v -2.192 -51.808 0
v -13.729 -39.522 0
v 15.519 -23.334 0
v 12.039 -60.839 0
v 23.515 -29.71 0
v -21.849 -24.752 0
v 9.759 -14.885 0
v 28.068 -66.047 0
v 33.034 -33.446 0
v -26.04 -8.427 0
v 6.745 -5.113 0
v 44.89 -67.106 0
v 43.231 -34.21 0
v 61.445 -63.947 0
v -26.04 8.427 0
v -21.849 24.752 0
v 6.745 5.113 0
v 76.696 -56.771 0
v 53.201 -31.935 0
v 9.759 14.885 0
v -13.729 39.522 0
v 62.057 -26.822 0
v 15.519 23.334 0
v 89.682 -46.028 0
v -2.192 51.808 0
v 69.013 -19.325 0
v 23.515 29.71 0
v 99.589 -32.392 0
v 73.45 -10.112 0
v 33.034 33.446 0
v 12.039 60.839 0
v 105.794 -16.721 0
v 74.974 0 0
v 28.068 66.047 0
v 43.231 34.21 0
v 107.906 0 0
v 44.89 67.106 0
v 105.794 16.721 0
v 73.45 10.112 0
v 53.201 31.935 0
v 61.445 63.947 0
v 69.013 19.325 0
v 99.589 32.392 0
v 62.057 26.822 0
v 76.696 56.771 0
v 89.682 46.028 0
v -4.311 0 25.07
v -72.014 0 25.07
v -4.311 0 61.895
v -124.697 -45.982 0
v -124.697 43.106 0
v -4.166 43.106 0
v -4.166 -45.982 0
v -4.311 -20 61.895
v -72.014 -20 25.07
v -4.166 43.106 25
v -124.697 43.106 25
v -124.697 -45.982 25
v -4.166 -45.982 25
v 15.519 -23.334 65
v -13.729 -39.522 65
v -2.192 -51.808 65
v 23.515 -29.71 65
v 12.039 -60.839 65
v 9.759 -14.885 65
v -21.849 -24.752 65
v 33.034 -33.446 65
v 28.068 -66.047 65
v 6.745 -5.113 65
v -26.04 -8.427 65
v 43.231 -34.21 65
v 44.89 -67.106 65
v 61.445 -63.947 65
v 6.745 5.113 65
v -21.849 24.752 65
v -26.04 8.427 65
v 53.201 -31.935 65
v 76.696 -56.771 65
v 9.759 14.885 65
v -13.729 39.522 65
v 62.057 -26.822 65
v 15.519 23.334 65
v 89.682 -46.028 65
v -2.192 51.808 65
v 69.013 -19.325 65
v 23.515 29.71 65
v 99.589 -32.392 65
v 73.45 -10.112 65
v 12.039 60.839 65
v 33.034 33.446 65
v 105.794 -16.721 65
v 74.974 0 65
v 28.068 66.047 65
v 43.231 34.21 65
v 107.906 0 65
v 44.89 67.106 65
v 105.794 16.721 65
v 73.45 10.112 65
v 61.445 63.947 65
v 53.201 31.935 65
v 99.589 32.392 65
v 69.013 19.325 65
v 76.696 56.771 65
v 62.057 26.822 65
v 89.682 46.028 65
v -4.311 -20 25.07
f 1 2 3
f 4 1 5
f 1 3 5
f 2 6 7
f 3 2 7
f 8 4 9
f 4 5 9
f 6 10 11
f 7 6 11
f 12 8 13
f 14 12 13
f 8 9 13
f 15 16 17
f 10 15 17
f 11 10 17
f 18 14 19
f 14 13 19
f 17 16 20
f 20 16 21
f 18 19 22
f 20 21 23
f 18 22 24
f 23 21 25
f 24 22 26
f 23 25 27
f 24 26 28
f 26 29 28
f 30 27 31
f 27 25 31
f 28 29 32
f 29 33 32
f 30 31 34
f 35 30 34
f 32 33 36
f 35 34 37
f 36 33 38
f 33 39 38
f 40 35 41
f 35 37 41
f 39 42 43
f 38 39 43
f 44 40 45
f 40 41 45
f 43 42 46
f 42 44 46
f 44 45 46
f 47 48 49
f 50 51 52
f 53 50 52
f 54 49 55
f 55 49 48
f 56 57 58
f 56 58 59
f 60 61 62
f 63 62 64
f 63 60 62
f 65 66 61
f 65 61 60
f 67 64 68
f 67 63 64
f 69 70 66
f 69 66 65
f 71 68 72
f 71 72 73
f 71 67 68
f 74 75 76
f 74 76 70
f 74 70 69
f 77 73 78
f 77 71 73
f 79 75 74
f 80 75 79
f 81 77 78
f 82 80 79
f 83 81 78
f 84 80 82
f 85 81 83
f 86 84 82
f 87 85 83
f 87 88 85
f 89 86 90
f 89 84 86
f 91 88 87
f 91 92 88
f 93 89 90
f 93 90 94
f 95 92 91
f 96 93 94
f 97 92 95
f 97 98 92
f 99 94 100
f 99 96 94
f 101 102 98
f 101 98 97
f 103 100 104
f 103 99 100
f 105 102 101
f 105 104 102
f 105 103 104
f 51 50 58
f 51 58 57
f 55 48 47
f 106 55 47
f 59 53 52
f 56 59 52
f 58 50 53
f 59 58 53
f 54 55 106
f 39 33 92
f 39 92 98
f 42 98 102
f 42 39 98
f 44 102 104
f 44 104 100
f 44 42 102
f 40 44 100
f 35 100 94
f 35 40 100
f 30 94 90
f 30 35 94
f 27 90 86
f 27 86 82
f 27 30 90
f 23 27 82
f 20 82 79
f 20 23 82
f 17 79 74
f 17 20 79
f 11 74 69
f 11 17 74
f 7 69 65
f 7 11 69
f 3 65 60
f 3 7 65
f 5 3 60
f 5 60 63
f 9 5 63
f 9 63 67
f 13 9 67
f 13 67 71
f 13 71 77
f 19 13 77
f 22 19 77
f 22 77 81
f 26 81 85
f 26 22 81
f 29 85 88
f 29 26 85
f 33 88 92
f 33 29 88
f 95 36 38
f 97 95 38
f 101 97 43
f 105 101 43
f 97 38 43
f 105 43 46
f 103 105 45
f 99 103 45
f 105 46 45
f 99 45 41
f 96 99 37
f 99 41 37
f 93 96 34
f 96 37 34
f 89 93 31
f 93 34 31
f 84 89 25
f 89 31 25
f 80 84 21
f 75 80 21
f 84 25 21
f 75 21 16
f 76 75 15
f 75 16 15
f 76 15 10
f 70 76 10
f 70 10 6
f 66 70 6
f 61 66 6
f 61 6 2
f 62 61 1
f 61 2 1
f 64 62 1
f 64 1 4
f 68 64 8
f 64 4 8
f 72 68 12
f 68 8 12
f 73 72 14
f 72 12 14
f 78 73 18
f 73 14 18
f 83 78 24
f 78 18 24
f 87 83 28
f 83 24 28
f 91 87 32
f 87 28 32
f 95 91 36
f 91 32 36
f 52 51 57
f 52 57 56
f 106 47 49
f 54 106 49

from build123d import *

# Parameters (mm, degrees)
F0_W     = 120.531016
F0_H     = 89.088138
F1_DEPTH = 25
F3_DEPTH = 20
F4_R     = 67.238267
F4_R_2   = 34.306256
F5_DEPTH = 65


with BuildPart() as f1:
    # F0 (on Top) → F1 (new body)
    with BuildSketch(Plane.XY):
        with Locations((-64.431909, -1.438359)):
            Rectangle(F0_W, F0_H)
    extrude(amount=F1_DEPTH)


with BuildPart() as f3:
    # F2 (on Front) → F3 (new body)
    with BuildSketch(Plane.XZ):
        Polygon((-4.311388, 61.895236), (-72.013728, 25.069697), (-4.311388, 25.069697), align=None)
    extrude(amount=F3_DEPTH)


with BuildPart() as f5:
    # F4 (on Top) → F5 (new body)
    with BuildSketch(Plane.XY):
        with Locations((40.667694, 0)):
            Circle(F4_R)
        with Locations((40.667694, 0)):
            Circle(F4_R_2, mode=Mode.SUBTRACT)
    extrude(amount=F5_DEPTH)


solid = Compound([f1.part, f3.part, f5.part])
